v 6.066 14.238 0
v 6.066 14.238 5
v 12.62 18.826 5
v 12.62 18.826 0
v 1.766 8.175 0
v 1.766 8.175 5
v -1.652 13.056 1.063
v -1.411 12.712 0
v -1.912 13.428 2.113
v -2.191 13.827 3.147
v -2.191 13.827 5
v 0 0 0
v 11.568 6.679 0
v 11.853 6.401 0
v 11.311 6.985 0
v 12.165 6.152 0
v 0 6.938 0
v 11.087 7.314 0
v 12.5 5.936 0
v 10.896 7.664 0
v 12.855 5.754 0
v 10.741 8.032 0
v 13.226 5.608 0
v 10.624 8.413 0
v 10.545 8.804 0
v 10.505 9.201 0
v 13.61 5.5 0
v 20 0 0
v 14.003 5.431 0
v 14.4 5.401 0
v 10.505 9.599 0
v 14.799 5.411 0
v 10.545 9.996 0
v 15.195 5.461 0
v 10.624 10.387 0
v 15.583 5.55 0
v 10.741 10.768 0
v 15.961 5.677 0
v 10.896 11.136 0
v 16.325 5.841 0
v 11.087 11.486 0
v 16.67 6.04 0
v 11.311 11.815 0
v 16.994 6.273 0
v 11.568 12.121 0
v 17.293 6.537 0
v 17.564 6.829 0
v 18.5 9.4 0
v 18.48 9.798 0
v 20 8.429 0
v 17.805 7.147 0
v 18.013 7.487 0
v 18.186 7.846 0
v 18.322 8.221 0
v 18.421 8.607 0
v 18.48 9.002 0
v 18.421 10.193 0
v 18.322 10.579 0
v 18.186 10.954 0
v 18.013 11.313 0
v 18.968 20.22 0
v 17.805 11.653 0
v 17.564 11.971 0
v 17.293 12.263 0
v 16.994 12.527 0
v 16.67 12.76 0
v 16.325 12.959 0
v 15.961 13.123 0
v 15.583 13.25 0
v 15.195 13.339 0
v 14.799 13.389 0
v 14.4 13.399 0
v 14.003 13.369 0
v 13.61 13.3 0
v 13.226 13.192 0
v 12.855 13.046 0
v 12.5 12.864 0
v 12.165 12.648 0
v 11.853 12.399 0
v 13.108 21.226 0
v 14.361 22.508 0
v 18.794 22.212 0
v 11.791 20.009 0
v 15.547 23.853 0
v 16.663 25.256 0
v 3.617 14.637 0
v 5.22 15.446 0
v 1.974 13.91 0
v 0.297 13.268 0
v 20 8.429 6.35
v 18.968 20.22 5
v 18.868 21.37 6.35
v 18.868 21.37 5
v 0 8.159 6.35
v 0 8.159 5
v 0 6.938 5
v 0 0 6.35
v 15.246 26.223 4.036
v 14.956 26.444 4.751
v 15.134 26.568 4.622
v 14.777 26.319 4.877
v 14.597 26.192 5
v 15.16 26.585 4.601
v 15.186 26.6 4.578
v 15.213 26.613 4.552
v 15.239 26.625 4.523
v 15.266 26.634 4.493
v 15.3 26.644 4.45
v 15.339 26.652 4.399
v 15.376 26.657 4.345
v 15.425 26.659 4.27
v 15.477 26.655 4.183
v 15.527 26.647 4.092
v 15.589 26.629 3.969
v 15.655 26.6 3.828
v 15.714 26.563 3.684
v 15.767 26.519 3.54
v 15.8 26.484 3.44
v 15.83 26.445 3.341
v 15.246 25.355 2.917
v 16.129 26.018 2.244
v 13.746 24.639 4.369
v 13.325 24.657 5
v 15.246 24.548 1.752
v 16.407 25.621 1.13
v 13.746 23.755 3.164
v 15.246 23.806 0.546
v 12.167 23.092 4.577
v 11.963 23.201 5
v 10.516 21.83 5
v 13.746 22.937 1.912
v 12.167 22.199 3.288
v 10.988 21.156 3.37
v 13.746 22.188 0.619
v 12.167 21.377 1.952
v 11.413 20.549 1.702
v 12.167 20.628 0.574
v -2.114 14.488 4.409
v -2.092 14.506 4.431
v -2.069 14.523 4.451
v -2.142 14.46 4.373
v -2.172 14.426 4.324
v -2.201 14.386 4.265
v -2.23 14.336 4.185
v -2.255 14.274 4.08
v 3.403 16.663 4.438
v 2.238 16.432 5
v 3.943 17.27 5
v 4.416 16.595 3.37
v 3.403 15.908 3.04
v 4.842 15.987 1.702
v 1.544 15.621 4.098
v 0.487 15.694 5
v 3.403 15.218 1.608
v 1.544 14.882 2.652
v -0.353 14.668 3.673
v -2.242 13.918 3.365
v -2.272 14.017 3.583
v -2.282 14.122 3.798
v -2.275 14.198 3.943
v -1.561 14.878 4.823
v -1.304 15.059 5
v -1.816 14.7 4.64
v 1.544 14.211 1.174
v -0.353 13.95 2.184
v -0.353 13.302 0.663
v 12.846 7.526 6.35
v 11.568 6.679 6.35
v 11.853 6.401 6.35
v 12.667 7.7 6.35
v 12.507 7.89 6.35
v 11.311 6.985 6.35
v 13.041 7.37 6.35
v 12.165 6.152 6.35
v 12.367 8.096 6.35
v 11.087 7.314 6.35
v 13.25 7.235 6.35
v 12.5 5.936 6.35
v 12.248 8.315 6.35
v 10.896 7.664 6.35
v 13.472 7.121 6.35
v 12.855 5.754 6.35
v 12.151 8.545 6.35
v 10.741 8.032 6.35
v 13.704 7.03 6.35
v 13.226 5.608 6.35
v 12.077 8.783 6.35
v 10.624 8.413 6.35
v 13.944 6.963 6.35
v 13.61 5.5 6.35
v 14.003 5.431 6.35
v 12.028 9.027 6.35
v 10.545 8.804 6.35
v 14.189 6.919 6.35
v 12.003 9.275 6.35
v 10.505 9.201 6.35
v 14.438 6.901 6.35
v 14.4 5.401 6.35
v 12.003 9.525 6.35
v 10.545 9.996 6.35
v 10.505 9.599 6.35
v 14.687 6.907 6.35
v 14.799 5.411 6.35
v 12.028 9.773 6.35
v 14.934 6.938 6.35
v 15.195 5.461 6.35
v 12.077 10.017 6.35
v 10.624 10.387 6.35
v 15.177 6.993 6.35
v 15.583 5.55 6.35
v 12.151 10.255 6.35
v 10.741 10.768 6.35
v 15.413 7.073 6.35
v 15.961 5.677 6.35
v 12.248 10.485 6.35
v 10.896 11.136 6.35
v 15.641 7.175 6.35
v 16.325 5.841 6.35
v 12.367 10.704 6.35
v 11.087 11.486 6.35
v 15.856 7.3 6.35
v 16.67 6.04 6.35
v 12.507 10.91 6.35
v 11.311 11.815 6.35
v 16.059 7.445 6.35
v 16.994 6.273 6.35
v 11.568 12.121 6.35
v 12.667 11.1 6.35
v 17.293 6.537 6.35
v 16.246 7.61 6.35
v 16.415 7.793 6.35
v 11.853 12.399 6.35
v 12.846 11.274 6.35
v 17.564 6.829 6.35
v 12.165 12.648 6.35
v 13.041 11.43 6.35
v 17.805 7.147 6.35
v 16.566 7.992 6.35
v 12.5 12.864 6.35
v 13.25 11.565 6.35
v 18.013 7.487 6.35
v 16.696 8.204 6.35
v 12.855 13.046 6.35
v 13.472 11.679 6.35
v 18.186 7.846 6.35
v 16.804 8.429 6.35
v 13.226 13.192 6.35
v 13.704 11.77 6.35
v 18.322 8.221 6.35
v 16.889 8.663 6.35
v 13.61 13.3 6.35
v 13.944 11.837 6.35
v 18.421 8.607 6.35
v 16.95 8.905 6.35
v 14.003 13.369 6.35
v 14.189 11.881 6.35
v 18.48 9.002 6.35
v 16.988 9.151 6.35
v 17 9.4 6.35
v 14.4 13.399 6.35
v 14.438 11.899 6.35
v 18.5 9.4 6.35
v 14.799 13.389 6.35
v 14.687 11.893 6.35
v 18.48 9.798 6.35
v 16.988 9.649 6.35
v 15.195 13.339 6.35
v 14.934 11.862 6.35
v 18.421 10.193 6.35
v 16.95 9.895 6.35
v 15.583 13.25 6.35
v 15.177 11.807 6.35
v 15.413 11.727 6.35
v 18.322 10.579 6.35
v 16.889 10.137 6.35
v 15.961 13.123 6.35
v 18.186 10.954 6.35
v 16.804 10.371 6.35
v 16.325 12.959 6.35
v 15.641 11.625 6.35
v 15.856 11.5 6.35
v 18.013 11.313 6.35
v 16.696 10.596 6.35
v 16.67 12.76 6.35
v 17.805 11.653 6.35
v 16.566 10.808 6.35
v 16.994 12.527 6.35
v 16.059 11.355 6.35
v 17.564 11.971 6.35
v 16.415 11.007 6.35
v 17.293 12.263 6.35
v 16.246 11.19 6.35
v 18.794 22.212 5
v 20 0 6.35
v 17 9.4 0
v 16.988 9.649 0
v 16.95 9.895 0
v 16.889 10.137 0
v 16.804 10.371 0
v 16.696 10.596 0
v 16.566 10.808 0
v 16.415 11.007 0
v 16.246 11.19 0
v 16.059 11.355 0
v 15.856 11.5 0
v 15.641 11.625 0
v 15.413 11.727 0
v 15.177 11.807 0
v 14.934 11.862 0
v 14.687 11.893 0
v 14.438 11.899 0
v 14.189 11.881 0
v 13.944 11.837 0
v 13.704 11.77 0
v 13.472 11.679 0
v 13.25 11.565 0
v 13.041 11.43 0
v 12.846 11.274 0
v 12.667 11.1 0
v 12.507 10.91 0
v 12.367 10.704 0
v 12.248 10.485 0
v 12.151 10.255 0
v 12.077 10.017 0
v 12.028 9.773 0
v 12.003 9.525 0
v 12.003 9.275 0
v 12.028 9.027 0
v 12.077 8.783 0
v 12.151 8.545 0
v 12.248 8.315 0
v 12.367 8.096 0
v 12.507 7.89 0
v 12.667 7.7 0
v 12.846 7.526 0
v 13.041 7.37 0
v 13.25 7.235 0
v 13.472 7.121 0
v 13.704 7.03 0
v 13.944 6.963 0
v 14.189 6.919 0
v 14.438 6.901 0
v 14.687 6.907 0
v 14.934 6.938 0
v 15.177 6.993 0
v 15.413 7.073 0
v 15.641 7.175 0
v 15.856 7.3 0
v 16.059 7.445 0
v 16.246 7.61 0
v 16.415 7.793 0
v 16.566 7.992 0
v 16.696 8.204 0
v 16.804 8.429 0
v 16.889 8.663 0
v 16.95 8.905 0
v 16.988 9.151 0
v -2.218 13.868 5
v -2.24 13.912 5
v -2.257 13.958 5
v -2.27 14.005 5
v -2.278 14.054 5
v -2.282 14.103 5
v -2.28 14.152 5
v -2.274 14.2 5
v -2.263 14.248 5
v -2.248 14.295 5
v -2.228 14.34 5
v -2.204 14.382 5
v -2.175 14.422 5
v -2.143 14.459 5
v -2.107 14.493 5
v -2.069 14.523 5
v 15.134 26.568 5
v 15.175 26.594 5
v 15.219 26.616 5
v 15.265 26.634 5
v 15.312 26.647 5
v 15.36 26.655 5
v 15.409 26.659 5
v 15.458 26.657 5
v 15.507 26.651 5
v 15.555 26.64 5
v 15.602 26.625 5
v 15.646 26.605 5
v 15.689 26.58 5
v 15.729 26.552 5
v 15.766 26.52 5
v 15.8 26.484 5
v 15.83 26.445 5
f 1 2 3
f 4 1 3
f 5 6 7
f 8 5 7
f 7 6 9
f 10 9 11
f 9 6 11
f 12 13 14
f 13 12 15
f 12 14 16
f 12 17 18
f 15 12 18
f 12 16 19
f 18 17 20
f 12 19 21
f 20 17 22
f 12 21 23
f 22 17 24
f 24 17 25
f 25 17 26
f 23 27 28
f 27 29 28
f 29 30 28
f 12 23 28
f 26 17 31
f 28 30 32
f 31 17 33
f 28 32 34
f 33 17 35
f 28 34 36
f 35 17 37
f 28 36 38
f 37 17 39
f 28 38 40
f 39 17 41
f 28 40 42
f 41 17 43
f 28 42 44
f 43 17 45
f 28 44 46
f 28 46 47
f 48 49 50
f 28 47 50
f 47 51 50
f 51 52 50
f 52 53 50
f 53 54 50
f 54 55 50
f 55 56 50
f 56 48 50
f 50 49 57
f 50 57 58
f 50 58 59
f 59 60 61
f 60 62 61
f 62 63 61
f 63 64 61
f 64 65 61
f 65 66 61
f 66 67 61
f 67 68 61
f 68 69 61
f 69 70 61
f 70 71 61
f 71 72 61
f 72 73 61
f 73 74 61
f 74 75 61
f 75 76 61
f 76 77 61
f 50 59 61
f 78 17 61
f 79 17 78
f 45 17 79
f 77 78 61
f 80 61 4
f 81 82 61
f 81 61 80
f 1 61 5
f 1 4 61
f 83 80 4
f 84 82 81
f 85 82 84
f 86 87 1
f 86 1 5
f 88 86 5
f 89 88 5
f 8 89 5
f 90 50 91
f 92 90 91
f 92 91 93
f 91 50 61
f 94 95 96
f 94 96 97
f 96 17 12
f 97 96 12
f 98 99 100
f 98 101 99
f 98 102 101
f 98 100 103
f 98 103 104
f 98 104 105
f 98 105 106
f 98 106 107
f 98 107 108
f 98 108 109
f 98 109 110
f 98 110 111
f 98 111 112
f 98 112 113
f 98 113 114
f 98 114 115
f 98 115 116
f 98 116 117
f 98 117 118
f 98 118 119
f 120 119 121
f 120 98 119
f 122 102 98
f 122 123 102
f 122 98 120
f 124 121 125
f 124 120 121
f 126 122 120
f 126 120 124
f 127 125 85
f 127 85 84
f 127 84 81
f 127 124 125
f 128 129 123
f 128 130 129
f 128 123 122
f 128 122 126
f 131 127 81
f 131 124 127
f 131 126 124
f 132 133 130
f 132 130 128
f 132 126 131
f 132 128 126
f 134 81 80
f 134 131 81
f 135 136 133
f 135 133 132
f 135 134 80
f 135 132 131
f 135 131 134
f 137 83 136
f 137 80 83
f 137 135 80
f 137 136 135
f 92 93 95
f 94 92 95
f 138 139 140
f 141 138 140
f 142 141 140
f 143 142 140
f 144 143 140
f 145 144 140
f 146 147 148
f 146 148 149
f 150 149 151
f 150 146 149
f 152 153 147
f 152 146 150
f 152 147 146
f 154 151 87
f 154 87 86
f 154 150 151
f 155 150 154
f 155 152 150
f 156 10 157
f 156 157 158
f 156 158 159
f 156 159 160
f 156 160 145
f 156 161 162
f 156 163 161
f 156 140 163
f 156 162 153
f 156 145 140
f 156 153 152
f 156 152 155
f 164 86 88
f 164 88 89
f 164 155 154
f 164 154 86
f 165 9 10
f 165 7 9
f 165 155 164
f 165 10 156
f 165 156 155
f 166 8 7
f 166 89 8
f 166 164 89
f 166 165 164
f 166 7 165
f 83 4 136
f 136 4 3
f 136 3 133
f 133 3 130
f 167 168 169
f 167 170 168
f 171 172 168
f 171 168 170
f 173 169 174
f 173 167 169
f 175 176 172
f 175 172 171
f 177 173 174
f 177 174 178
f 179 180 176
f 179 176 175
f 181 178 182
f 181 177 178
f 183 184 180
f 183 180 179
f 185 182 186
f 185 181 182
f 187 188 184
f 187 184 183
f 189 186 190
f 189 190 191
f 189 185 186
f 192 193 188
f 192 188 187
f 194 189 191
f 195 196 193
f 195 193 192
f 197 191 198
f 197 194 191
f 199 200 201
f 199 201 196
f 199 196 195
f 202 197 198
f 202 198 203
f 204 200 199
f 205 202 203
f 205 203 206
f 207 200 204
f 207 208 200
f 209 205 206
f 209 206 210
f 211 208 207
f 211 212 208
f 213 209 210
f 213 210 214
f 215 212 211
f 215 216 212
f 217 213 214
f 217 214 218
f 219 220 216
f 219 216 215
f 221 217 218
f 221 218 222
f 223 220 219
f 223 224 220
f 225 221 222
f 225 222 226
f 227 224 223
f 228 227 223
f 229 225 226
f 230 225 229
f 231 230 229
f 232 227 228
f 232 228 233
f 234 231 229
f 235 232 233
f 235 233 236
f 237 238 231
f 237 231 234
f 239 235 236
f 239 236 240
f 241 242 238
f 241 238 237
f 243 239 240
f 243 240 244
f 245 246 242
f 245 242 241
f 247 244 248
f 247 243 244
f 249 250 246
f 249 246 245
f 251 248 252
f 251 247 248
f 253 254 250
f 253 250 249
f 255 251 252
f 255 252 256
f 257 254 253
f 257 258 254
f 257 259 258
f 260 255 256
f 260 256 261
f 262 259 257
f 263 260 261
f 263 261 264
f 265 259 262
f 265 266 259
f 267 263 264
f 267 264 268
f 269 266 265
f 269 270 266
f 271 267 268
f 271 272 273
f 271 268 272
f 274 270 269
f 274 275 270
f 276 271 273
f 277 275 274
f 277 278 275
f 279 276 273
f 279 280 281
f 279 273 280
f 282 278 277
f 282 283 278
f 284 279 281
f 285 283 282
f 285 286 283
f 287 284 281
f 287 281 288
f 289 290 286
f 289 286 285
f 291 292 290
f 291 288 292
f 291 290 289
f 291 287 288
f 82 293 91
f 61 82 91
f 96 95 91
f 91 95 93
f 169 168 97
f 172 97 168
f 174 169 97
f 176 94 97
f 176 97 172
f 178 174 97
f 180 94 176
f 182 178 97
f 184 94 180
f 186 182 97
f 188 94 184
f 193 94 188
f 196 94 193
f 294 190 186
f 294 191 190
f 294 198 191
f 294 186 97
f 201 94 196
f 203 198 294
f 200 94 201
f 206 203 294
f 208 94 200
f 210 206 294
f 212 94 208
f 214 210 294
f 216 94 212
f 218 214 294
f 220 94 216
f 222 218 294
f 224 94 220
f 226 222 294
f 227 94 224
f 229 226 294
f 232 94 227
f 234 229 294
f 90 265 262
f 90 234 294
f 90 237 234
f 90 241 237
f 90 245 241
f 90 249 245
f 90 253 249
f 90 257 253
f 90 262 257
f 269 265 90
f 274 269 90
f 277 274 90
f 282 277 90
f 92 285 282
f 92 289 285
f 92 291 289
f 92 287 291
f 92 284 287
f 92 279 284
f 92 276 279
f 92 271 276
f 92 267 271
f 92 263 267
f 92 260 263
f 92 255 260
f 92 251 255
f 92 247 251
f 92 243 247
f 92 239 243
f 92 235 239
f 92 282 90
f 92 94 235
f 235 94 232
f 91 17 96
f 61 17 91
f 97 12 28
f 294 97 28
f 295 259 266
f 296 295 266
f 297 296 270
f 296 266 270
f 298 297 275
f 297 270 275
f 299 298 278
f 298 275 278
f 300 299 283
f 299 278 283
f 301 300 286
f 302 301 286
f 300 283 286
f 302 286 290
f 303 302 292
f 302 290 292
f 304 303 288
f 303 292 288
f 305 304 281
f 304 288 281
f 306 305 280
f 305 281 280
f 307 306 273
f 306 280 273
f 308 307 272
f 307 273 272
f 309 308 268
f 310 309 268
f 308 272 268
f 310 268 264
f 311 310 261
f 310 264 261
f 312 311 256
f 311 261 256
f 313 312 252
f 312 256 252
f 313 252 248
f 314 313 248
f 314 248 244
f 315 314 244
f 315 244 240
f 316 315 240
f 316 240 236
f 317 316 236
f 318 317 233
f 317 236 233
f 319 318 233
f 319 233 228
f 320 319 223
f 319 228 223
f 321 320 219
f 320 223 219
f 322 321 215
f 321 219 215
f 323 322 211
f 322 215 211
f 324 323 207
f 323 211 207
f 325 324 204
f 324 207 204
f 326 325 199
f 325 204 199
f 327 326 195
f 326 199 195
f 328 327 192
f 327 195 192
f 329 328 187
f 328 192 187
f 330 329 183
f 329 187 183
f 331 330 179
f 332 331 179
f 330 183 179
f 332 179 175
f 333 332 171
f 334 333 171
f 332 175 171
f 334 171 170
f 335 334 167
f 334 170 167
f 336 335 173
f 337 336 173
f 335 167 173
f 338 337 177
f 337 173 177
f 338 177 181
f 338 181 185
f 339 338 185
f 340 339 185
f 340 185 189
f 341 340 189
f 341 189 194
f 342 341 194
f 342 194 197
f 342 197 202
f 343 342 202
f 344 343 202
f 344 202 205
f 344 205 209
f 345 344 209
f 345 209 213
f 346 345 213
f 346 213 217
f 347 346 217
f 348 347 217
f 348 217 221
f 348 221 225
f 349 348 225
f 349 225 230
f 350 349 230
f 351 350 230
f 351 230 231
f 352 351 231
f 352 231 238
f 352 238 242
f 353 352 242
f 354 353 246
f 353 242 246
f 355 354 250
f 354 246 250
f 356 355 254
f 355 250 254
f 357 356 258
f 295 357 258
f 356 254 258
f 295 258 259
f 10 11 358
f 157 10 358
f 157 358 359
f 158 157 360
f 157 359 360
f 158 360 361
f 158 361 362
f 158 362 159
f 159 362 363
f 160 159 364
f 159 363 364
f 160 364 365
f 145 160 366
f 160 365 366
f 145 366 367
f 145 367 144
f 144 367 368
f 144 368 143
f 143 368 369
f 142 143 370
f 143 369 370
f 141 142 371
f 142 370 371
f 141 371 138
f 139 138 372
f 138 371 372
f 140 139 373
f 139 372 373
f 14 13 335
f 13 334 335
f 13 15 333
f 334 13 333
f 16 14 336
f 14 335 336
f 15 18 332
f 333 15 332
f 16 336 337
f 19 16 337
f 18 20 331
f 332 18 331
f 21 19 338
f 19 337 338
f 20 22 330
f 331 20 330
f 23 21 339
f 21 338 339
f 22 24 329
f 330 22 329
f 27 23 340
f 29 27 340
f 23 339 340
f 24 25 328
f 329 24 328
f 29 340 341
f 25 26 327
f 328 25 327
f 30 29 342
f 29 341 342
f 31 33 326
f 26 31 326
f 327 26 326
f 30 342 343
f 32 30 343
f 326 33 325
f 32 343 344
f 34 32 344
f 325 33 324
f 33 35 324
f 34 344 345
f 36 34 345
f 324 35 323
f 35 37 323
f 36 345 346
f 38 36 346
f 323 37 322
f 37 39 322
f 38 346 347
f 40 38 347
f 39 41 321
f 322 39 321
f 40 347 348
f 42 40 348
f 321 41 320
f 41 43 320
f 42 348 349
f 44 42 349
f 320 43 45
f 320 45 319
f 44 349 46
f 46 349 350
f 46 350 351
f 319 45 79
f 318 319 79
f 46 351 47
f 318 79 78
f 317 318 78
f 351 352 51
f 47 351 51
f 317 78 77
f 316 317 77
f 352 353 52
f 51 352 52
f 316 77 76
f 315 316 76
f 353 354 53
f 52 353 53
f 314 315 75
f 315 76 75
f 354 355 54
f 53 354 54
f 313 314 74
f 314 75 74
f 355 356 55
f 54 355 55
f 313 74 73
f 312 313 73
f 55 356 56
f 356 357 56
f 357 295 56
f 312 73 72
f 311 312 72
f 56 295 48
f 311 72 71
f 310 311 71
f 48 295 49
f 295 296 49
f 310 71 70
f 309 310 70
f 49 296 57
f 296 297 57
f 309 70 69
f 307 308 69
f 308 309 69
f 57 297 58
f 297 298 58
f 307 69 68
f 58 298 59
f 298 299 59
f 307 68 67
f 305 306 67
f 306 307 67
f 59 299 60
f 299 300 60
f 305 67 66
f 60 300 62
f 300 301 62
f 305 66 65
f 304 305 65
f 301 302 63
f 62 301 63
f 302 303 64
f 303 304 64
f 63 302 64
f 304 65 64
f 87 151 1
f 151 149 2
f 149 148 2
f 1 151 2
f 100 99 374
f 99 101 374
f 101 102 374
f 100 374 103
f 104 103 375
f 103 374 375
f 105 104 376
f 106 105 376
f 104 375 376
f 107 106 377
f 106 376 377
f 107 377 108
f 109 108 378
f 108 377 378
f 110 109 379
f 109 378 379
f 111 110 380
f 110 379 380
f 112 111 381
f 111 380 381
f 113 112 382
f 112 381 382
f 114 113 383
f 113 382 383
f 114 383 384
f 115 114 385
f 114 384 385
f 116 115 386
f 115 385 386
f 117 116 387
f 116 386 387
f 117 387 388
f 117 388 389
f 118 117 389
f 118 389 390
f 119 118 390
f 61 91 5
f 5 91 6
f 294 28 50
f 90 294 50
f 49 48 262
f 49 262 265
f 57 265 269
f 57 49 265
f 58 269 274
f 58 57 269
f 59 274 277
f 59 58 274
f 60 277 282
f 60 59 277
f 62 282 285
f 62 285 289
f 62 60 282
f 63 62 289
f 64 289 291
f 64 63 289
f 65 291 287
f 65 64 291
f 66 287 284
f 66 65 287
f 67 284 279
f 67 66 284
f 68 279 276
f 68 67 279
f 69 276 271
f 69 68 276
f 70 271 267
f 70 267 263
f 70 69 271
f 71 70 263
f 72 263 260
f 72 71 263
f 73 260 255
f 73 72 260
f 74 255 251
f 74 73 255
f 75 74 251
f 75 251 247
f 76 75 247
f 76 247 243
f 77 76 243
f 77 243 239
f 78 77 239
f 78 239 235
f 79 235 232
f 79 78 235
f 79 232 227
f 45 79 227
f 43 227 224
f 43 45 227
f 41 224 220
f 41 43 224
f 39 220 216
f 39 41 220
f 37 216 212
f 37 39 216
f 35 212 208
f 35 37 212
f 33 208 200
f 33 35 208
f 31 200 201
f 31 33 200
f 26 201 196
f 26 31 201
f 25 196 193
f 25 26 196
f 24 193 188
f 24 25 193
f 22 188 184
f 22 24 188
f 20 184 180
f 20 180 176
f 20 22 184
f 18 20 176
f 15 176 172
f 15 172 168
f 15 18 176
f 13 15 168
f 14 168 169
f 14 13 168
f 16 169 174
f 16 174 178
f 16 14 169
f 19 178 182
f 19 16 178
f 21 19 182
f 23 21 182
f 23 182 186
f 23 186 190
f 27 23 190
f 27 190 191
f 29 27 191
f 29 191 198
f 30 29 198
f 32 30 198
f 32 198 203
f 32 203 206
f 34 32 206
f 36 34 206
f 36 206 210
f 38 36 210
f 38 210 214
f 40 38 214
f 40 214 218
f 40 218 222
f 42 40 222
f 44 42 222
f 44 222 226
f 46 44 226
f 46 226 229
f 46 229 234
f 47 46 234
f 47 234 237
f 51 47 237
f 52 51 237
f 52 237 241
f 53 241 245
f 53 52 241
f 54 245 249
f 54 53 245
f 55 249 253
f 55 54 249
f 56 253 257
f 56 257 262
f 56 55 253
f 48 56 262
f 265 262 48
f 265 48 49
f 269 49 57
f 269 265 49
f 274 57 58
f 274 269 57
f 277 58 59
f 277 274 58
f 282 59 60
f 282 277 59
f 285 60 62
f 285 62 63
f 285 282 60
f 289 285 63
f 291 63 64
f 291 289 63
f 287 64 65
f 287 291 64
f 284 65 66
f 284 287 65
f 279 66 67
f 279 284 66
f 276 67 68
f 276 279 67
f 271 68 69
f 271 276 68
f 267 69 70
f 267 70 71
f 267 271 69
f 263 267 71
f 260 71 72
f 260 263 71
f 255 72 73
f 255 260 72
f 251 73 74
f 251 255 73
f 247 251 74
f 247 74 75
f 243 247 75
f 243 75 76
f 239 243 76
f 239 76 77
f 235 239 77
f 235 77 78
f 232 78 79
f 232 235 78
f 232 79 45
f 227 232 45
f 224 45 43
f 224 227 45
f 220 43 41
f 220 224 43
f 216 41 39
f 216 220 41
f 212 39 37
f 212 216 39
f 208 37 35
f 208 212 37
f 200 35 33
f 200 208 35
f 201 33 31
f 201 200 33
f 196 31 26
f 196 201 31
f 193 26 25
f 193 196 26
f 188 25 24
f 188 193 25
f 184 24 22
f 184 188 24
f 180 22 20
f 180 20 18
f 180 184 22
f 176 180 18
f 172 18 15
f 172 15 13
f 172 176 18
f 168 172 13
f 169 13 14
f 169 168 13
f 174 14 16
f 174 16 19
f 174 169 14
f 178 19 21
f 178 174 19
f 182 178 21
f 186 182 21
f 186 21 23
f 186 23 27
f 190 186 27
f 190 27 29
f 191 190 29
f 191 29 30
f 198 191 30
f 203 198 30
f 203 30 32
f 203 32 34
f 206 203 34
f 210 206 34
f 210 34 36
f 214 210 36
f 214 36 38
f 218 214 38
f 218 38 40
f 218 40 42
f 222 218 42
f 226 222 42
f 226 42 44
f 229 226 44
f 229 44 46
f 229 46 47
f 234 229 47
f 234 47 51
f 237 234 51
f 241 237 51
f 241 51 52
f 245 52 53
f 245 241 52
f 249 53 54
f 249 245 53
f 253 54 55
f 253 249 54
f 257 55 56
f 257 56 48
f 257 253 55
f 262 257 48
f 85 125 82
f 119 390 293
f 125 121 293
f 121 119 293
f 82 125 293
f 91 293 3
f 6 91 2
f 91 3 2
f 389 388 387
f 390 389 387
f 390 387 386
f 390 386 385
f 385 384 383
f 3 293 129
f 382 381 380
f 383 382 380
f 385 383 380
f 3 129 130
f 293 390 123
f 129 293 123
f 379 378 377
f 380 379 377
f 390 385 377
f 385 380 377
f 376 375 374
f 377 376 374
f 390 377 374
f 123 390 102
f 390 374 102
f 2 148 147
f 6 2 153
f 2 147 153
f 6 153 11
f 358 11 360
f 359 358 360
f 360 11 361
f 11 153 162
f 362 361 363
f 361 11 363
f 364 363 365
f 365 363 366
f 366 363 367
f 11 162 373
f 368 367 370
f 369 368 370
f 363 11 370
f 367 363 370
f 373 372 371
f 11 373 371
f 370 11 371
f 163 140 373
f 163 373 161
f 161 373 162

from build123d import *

# Parameters (mm, degrees)
SKIZZE1_R                       = 4
AUFSATZ_LINEAR_AUSTRAGEN1_DEPTH = 6.35
SKIZZE3_W                       = 27.712900838
SKIZZE3_H                       = 5
SCHNITT_LINEAR_AUSTRAGEN1_DEPTH = 1
AUFSATZ_LINEAR_AUSTRAGEN2_DEPTH = 5
SKIZZE6_R                       = 4
SKIZZE6_R_2                     = 2.5
AUFSATZ_LINEAR_AUSTRAGEN3_DEPTH = 6.35


with BuildPart() as part:
    # Skizze1 → Aufsatz-Linear austragen1 (new body)
    with BuildSketch(Plane.XY):
        Polygon((20, 8.428552255), (18.867770033, 21.37), (0, 8.158645194), (0, 0), (20, 0), align=None)
        with Locations((14.5, 9.4)):
            Circle(SKIZZE1_R, mode=Mode.SUBTRACT)
    extrude(amount=AUFSATZ_LINEAR_AUSTRAGEN1_DEPTH)

    # Skizze3 → Schnitt-Linear austragen1 (cut)
    with BuildSketch(Plane(origin=(-3.833309342, 5.474533096, 0), x_dir=(0.819152044, 0.573576436, 0), z_dir=(-0.573576436, 0.819152044, 0))):
        with Locations((13.856450419, -2.5)):
            Rectangle(SKIZZE3_W, SKIZZE3_H)
    extrude(amount=-SCHNITT_LINEAR_AUSTRAGEN1_DEPTH, mode=Mode.SUBTRACT)


with BuildPart() as body_2:
    # Skizze4 → Aufsatz-Linear austragen2 (new body)
    with BuildSketch(Plane(origin=(0, 0, 5), x_dir=(-1, 0, 0), z_dir=(0, 0, -1))):
        with BuildLine():
            Line((-18.79409733, 22.212082842), (-18.968408816, 20.219693446))
            Line((-18.968408816, 20.219693446), (-1.766215886, 8.174588282))
            Line((-1.766215886, 8.174588282), (2.191461525, 13.826737388))
            ThreePointArc((2.191461525, 13.826737388), (2.27428938, 14.200349695), (2.068673721, 14.523101628))
            Line((2.068673721, 14.523101628), (-3.255814567, 18.251348465))
            Line((-3.255814567, 18.251348465), (-6.066339105, 14.237503448))
            Line((-6.066339105, 14.237503448), (-12.619555459, 18.826114938))
            Line((-12.619555459, 18.826114938), (-9.809030921, 22.839959955))
            Line((-9.809030921, 22.839959955), (-15.133519209, 26.568206792))
            ThreePointArc((-15.133519209, 26.568206792), (-15.507131516, 26.651034646), (-15.829883449, 26.445418988))
            Line((-15.829883449, 26.445418988), (-18.79409733, 22.212082842))
        make_face()
    extrude(amount=AUFSATZ_LINEAR_AUSTRAGEN2_DEPTH)

    # Skizze5 → Schnitt-Rotation1 (revolve, cut)
    with BuildSketch(Plane.XY.offset(-12.575)):
        with BuildLine():
            Line((-48.8465, 46.47), (25.9465, 46.47))
            ThreePointArc((25.9465, 46.47), (-11.45, 9.0735), (-48.8465, 46.47))
        make_face()
    revolve(axis=Axis((-48.8465, 46.47, -12.575), (1, 0, 0)), mode=Mode.SUBTRACT)


with BuildPart() as body_3:
    # Skizze6 → Aufsatz-Linear austragen3 (new body)
    with BuildSketch(Plane.XY.offset(6.35)):
        with Locations((14.5, 9.4)):
            Circle(SKIZZE6_R)
        with Locations((14.5, 9.4)):
            Circle(SKIZZE6_R_2, mode=Mode.SUBTRACT)
    extrude(amount=-AUFSATZ_LINEAR_AUSTRAGEN3_DEPTH)


solid = Compound([part.part, body_2.part, body_3.part])
